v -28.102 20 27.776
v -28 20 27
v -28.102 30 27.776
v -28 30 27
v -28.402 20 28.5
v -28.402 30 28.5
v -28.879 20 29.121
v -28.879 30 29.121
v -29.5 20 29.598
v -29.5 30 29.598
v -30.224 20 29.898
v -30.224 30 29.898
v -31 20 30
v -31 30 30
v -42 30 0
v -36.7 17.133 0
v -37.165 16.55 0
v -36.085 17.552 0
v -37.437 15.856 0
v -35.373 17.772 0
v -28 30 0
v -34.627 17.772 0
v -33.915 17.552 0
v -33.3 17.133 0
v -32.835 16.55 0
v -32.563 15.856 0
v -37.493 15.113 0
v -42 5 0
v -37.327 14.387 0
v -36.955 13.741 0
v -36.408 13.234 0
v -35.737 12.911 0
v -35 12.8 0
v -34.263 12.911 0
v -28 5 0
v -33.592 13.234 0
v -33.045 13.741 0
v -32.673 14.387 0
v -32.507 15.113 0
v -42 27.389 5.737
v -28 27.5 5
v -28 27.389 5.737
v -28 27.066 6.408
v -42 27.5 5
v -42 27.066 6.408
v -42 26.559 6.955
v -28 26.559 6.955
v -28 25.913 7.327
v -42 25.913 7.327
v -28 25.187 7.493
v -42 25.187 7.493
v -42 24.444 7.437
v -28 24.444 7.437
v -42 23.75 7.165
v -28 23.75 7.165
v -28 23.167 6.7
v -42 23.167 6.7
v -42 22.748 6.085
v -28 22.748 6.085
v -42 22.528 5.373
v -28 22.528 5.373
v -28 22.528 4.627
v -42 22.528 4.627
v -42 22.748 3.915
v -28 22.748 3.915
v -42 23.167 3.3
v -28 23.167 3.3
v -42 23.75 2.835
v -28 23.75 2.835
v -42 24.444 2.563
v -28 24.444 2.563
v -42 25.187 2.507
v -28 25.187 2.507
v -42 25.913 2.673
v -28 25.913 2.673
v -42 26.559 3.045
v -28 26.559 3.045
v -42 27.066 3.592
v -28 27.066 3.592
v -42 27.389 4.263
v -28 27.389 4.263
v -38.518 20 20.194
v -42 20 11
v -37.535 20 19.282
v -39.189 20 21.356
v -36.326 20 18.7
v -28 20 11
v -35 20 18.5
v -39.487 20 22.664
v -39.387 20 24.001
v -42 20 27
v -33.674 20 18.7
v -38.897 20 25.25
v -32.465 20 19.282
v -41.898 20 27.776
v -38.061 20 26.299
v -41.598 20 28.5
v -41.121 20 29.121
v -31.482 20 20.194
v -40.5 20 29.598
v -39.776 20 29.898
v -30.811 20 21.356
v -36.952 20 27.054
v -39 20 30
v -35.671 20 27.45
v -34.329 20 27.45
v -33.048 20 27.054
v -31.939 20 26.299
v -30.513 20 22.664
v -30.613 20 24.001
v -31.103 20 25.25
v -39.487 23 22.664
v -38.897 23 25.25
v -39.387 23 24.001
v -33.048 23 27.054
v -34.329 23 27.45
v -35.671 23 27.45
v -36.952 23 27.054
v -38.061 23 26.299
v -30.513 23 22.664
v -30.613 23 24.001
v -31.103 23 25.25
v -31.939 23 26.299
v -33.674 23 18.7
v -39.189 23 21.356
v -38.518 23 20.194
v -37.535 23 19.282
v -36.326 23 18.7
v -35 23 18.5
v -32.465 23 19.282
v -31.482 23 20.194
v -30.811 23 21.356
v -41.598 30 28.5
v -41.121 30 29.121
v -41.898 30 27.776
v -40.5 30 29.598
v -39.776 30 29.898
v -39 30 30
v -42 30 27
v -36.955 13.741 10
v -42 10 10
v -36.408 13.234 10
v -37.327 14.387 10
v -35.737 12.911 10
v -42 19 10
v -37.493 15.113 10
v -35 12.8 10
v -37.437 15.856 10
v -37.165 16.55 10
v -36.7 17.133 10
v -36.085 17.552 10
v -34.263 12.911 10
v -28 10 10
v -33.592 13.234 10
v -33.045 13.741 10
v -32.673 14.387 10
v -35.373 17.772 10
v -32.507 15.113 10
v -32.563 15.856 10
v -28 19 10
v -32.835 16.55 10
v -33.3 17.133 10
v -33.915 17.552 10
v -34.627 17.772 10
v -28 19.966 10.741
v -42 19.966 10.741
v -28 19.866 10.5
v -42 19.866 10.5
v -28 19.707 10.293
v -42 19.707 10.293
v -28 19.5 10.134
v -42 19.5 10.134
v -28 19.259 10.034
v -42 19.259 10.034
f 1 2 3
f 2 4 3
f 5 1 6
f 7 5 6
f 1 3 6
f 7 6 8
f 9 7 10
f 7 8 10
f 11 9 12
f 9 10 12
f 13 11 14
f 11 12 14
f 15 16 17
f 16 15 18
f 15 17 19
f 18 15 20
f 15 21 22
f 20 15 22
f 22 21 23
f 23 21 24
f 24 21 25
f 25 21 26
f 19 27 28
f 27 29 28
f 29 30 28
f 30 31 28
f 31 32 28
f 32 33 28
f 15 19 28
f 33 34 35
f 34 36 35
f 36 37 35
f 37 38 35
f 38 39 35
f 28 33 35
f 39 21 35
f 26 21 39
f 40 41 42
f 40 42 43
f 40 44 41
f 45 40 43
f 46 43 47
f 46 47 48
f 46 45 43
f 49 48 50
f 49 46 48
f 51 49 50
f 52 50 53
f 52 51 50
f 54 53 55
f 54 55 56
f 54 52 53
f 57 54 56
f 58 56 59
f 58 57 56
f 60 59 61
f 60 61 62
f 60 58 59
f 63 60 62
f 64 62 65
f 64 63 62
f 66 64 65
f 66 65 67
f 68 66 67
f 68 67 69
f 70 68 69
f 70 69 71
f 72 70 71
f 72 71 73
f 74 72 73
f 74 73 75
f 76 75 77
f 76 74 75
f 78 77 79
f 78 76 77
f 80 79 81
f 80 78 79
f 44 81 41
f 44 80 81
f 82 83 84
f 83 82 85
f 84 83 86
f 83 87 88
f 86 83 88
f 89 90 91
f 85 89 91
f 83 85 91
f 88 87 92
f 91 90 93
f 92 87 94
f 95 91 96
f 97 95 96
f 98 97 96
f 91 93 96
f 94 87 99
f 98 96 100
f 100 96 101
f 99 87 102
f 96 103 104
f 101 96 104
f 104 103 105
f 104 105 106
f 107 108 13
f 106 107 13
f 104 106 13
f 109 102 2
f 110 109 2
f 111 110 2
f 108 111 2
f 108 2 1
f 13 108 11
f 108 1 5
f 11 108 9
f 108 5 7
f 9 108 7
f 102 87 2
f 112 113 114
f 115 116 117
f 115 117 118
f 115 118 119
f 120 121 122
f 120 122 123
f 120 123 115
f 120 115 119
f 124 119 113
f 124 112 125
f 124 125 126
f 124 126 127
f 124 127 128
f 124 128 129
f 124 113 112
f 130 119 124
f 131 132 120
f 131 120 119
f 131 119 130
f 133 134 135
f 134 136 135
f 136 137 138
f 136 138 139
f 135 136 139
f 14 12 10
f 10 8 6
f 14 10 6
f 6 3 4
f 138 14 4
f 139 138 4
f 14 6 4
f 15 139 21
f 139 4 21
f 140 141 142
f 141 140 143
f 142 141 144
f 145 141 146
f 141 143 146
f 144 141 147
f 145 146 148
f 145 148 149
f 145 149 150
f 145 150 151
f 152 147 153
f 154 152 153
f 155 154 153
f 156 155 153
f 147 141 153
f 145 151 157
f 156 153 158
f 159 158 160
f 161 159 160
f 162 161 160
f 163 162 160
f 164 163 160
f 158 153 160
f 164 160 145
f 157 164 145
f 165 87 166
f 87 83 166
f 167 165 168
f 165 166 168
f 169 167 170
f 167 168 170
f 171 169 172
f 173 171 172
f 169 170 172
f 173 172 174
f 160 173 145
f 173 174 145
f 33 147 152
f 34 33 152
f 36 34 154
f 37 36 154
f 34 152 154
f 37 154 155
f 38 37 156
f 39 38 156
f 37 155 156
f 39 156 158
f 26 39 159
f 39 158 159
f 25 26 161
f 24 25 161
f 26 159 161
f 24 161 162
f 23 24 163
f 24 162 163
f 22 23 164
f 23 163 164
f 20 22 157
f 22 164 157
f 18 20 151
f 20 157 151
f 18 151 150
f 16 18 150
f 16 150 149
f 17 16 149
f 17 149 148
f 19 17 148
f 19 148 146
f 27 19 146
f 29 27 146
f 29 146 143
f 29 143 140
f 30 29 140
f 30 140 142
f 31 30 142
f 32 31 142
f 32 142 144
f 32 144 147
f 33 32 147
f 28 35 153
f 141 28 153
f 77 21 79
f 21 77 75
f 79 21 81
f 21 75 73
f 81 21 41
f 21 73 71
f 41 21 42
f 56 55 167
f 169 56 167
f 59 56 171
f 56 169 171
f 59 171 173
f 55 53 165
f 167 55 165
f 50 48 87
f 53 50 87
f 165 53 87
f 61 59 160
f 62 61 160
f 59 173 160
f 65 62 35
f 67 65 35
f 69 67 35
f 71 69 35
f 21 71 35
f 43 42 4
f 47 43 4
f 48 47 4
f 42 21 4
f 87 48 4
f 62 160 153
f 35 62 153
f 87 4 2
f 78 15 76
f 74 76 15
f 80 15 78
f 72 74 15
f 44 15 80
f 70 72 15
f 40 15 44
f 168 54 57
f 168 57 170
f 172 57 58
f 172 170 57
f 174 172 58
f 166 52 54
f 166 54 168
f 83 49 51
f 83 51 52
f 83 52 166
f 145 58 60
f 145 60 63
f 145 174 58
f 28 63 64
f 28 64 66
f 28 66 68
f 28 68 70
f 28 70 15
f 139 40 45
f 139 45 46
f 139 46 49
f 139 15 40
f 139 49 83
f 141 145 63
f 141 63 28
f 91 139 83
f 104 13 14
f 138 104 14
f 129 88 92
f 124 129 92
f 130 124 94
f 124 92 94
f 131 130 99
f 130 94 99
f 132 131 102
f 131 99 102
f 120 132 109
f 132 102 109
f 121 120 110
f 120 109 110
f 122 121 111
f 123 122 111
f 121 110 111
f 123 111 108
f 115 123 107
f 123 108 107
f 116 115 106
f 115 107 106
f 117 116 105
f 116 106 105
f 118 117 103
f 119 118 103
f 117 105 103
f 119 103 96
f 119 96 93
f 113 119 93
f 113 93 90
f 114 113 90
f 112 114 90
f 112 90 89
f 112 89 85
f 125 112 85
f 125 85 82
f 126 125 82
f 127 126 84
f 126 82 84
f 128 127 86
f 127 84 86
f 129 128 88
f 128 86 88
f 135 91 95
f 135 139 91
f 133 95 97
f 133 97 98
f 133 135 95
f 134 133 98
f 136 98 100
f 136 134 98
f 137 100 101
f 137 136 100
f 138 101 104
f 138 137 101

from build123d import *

# Parameters (mm, degrees)
SKETCH002_R     = 2.5
PAD001_DEPTH    = 7
SKETCH003_R     = 4.5
POCKET001_DEPTH = 3
FILLET_R        = 3
SKETCH004_R     = 2.5
POCKET002_DEPTH = 10.001
FILLET001_R     = 1


with BuildPart() as part:
    # Sketch002 → Pad001 (new body, symmetric)
    with BuildSketch(Plane.YZ):
        Polygon((10, 10), (20, 10), (20, 30), (30, 30), (30, 0), (5, 0), align=None)
        with Locations((25, 5)):
            Circle(SKETCH002_R, mode=Mode.SUBTRACT)
    extrude(amount=PAD001_DEPTH, both=True)

    # Sketch003 (on Face2 of Pad001) → Pocket001 (cut)
    with BuildSketch(Plane(origin=(0, 20, 0), x_dir=(0, 0, -1), z_dir=(0, -1, 0))):
        with Locations((-23, 0)):
            Circle(SKETCH003_R)
    extrude(amount=-POCKET001_DEPTH, mode=Mode.SUBTRACT)

    # Fillet
    fillet_edges = [part.edges().sort_by_distance(p)[0] for p in [
        (-7, 25, 30),
        (7, 25, 30),
    ]]
    fillet(fillet_edges, radius=FILLET_R)

    # Sketch004 (on Face4 of Fillet) → Pocket002 (cut, through all)
    with BuildSketch(Plane(origin=(0, 0, 10), x_dir=(0, -1, 0), z_dir=(0, 0, 1))):
        with Locations((-15.3, 0)):
            Circle(SKETCH004_R)
    extrude(amount=-POCKET002_DEPTH, mode=Mode.SUBTRACT)

    # Fillet001
    fillet001_edges = [part.edges().sort_by_distance(p)[0] for p in [
        (0, 20, 10),
    ]]
    fillet(fillet001_edges, radius=FILLET001_R)


with BuildPart() as part_1:
    # Body001 placement: moved
    add(part.part.moved(Location((-35, 0, 0))))


solid = part_1.part
